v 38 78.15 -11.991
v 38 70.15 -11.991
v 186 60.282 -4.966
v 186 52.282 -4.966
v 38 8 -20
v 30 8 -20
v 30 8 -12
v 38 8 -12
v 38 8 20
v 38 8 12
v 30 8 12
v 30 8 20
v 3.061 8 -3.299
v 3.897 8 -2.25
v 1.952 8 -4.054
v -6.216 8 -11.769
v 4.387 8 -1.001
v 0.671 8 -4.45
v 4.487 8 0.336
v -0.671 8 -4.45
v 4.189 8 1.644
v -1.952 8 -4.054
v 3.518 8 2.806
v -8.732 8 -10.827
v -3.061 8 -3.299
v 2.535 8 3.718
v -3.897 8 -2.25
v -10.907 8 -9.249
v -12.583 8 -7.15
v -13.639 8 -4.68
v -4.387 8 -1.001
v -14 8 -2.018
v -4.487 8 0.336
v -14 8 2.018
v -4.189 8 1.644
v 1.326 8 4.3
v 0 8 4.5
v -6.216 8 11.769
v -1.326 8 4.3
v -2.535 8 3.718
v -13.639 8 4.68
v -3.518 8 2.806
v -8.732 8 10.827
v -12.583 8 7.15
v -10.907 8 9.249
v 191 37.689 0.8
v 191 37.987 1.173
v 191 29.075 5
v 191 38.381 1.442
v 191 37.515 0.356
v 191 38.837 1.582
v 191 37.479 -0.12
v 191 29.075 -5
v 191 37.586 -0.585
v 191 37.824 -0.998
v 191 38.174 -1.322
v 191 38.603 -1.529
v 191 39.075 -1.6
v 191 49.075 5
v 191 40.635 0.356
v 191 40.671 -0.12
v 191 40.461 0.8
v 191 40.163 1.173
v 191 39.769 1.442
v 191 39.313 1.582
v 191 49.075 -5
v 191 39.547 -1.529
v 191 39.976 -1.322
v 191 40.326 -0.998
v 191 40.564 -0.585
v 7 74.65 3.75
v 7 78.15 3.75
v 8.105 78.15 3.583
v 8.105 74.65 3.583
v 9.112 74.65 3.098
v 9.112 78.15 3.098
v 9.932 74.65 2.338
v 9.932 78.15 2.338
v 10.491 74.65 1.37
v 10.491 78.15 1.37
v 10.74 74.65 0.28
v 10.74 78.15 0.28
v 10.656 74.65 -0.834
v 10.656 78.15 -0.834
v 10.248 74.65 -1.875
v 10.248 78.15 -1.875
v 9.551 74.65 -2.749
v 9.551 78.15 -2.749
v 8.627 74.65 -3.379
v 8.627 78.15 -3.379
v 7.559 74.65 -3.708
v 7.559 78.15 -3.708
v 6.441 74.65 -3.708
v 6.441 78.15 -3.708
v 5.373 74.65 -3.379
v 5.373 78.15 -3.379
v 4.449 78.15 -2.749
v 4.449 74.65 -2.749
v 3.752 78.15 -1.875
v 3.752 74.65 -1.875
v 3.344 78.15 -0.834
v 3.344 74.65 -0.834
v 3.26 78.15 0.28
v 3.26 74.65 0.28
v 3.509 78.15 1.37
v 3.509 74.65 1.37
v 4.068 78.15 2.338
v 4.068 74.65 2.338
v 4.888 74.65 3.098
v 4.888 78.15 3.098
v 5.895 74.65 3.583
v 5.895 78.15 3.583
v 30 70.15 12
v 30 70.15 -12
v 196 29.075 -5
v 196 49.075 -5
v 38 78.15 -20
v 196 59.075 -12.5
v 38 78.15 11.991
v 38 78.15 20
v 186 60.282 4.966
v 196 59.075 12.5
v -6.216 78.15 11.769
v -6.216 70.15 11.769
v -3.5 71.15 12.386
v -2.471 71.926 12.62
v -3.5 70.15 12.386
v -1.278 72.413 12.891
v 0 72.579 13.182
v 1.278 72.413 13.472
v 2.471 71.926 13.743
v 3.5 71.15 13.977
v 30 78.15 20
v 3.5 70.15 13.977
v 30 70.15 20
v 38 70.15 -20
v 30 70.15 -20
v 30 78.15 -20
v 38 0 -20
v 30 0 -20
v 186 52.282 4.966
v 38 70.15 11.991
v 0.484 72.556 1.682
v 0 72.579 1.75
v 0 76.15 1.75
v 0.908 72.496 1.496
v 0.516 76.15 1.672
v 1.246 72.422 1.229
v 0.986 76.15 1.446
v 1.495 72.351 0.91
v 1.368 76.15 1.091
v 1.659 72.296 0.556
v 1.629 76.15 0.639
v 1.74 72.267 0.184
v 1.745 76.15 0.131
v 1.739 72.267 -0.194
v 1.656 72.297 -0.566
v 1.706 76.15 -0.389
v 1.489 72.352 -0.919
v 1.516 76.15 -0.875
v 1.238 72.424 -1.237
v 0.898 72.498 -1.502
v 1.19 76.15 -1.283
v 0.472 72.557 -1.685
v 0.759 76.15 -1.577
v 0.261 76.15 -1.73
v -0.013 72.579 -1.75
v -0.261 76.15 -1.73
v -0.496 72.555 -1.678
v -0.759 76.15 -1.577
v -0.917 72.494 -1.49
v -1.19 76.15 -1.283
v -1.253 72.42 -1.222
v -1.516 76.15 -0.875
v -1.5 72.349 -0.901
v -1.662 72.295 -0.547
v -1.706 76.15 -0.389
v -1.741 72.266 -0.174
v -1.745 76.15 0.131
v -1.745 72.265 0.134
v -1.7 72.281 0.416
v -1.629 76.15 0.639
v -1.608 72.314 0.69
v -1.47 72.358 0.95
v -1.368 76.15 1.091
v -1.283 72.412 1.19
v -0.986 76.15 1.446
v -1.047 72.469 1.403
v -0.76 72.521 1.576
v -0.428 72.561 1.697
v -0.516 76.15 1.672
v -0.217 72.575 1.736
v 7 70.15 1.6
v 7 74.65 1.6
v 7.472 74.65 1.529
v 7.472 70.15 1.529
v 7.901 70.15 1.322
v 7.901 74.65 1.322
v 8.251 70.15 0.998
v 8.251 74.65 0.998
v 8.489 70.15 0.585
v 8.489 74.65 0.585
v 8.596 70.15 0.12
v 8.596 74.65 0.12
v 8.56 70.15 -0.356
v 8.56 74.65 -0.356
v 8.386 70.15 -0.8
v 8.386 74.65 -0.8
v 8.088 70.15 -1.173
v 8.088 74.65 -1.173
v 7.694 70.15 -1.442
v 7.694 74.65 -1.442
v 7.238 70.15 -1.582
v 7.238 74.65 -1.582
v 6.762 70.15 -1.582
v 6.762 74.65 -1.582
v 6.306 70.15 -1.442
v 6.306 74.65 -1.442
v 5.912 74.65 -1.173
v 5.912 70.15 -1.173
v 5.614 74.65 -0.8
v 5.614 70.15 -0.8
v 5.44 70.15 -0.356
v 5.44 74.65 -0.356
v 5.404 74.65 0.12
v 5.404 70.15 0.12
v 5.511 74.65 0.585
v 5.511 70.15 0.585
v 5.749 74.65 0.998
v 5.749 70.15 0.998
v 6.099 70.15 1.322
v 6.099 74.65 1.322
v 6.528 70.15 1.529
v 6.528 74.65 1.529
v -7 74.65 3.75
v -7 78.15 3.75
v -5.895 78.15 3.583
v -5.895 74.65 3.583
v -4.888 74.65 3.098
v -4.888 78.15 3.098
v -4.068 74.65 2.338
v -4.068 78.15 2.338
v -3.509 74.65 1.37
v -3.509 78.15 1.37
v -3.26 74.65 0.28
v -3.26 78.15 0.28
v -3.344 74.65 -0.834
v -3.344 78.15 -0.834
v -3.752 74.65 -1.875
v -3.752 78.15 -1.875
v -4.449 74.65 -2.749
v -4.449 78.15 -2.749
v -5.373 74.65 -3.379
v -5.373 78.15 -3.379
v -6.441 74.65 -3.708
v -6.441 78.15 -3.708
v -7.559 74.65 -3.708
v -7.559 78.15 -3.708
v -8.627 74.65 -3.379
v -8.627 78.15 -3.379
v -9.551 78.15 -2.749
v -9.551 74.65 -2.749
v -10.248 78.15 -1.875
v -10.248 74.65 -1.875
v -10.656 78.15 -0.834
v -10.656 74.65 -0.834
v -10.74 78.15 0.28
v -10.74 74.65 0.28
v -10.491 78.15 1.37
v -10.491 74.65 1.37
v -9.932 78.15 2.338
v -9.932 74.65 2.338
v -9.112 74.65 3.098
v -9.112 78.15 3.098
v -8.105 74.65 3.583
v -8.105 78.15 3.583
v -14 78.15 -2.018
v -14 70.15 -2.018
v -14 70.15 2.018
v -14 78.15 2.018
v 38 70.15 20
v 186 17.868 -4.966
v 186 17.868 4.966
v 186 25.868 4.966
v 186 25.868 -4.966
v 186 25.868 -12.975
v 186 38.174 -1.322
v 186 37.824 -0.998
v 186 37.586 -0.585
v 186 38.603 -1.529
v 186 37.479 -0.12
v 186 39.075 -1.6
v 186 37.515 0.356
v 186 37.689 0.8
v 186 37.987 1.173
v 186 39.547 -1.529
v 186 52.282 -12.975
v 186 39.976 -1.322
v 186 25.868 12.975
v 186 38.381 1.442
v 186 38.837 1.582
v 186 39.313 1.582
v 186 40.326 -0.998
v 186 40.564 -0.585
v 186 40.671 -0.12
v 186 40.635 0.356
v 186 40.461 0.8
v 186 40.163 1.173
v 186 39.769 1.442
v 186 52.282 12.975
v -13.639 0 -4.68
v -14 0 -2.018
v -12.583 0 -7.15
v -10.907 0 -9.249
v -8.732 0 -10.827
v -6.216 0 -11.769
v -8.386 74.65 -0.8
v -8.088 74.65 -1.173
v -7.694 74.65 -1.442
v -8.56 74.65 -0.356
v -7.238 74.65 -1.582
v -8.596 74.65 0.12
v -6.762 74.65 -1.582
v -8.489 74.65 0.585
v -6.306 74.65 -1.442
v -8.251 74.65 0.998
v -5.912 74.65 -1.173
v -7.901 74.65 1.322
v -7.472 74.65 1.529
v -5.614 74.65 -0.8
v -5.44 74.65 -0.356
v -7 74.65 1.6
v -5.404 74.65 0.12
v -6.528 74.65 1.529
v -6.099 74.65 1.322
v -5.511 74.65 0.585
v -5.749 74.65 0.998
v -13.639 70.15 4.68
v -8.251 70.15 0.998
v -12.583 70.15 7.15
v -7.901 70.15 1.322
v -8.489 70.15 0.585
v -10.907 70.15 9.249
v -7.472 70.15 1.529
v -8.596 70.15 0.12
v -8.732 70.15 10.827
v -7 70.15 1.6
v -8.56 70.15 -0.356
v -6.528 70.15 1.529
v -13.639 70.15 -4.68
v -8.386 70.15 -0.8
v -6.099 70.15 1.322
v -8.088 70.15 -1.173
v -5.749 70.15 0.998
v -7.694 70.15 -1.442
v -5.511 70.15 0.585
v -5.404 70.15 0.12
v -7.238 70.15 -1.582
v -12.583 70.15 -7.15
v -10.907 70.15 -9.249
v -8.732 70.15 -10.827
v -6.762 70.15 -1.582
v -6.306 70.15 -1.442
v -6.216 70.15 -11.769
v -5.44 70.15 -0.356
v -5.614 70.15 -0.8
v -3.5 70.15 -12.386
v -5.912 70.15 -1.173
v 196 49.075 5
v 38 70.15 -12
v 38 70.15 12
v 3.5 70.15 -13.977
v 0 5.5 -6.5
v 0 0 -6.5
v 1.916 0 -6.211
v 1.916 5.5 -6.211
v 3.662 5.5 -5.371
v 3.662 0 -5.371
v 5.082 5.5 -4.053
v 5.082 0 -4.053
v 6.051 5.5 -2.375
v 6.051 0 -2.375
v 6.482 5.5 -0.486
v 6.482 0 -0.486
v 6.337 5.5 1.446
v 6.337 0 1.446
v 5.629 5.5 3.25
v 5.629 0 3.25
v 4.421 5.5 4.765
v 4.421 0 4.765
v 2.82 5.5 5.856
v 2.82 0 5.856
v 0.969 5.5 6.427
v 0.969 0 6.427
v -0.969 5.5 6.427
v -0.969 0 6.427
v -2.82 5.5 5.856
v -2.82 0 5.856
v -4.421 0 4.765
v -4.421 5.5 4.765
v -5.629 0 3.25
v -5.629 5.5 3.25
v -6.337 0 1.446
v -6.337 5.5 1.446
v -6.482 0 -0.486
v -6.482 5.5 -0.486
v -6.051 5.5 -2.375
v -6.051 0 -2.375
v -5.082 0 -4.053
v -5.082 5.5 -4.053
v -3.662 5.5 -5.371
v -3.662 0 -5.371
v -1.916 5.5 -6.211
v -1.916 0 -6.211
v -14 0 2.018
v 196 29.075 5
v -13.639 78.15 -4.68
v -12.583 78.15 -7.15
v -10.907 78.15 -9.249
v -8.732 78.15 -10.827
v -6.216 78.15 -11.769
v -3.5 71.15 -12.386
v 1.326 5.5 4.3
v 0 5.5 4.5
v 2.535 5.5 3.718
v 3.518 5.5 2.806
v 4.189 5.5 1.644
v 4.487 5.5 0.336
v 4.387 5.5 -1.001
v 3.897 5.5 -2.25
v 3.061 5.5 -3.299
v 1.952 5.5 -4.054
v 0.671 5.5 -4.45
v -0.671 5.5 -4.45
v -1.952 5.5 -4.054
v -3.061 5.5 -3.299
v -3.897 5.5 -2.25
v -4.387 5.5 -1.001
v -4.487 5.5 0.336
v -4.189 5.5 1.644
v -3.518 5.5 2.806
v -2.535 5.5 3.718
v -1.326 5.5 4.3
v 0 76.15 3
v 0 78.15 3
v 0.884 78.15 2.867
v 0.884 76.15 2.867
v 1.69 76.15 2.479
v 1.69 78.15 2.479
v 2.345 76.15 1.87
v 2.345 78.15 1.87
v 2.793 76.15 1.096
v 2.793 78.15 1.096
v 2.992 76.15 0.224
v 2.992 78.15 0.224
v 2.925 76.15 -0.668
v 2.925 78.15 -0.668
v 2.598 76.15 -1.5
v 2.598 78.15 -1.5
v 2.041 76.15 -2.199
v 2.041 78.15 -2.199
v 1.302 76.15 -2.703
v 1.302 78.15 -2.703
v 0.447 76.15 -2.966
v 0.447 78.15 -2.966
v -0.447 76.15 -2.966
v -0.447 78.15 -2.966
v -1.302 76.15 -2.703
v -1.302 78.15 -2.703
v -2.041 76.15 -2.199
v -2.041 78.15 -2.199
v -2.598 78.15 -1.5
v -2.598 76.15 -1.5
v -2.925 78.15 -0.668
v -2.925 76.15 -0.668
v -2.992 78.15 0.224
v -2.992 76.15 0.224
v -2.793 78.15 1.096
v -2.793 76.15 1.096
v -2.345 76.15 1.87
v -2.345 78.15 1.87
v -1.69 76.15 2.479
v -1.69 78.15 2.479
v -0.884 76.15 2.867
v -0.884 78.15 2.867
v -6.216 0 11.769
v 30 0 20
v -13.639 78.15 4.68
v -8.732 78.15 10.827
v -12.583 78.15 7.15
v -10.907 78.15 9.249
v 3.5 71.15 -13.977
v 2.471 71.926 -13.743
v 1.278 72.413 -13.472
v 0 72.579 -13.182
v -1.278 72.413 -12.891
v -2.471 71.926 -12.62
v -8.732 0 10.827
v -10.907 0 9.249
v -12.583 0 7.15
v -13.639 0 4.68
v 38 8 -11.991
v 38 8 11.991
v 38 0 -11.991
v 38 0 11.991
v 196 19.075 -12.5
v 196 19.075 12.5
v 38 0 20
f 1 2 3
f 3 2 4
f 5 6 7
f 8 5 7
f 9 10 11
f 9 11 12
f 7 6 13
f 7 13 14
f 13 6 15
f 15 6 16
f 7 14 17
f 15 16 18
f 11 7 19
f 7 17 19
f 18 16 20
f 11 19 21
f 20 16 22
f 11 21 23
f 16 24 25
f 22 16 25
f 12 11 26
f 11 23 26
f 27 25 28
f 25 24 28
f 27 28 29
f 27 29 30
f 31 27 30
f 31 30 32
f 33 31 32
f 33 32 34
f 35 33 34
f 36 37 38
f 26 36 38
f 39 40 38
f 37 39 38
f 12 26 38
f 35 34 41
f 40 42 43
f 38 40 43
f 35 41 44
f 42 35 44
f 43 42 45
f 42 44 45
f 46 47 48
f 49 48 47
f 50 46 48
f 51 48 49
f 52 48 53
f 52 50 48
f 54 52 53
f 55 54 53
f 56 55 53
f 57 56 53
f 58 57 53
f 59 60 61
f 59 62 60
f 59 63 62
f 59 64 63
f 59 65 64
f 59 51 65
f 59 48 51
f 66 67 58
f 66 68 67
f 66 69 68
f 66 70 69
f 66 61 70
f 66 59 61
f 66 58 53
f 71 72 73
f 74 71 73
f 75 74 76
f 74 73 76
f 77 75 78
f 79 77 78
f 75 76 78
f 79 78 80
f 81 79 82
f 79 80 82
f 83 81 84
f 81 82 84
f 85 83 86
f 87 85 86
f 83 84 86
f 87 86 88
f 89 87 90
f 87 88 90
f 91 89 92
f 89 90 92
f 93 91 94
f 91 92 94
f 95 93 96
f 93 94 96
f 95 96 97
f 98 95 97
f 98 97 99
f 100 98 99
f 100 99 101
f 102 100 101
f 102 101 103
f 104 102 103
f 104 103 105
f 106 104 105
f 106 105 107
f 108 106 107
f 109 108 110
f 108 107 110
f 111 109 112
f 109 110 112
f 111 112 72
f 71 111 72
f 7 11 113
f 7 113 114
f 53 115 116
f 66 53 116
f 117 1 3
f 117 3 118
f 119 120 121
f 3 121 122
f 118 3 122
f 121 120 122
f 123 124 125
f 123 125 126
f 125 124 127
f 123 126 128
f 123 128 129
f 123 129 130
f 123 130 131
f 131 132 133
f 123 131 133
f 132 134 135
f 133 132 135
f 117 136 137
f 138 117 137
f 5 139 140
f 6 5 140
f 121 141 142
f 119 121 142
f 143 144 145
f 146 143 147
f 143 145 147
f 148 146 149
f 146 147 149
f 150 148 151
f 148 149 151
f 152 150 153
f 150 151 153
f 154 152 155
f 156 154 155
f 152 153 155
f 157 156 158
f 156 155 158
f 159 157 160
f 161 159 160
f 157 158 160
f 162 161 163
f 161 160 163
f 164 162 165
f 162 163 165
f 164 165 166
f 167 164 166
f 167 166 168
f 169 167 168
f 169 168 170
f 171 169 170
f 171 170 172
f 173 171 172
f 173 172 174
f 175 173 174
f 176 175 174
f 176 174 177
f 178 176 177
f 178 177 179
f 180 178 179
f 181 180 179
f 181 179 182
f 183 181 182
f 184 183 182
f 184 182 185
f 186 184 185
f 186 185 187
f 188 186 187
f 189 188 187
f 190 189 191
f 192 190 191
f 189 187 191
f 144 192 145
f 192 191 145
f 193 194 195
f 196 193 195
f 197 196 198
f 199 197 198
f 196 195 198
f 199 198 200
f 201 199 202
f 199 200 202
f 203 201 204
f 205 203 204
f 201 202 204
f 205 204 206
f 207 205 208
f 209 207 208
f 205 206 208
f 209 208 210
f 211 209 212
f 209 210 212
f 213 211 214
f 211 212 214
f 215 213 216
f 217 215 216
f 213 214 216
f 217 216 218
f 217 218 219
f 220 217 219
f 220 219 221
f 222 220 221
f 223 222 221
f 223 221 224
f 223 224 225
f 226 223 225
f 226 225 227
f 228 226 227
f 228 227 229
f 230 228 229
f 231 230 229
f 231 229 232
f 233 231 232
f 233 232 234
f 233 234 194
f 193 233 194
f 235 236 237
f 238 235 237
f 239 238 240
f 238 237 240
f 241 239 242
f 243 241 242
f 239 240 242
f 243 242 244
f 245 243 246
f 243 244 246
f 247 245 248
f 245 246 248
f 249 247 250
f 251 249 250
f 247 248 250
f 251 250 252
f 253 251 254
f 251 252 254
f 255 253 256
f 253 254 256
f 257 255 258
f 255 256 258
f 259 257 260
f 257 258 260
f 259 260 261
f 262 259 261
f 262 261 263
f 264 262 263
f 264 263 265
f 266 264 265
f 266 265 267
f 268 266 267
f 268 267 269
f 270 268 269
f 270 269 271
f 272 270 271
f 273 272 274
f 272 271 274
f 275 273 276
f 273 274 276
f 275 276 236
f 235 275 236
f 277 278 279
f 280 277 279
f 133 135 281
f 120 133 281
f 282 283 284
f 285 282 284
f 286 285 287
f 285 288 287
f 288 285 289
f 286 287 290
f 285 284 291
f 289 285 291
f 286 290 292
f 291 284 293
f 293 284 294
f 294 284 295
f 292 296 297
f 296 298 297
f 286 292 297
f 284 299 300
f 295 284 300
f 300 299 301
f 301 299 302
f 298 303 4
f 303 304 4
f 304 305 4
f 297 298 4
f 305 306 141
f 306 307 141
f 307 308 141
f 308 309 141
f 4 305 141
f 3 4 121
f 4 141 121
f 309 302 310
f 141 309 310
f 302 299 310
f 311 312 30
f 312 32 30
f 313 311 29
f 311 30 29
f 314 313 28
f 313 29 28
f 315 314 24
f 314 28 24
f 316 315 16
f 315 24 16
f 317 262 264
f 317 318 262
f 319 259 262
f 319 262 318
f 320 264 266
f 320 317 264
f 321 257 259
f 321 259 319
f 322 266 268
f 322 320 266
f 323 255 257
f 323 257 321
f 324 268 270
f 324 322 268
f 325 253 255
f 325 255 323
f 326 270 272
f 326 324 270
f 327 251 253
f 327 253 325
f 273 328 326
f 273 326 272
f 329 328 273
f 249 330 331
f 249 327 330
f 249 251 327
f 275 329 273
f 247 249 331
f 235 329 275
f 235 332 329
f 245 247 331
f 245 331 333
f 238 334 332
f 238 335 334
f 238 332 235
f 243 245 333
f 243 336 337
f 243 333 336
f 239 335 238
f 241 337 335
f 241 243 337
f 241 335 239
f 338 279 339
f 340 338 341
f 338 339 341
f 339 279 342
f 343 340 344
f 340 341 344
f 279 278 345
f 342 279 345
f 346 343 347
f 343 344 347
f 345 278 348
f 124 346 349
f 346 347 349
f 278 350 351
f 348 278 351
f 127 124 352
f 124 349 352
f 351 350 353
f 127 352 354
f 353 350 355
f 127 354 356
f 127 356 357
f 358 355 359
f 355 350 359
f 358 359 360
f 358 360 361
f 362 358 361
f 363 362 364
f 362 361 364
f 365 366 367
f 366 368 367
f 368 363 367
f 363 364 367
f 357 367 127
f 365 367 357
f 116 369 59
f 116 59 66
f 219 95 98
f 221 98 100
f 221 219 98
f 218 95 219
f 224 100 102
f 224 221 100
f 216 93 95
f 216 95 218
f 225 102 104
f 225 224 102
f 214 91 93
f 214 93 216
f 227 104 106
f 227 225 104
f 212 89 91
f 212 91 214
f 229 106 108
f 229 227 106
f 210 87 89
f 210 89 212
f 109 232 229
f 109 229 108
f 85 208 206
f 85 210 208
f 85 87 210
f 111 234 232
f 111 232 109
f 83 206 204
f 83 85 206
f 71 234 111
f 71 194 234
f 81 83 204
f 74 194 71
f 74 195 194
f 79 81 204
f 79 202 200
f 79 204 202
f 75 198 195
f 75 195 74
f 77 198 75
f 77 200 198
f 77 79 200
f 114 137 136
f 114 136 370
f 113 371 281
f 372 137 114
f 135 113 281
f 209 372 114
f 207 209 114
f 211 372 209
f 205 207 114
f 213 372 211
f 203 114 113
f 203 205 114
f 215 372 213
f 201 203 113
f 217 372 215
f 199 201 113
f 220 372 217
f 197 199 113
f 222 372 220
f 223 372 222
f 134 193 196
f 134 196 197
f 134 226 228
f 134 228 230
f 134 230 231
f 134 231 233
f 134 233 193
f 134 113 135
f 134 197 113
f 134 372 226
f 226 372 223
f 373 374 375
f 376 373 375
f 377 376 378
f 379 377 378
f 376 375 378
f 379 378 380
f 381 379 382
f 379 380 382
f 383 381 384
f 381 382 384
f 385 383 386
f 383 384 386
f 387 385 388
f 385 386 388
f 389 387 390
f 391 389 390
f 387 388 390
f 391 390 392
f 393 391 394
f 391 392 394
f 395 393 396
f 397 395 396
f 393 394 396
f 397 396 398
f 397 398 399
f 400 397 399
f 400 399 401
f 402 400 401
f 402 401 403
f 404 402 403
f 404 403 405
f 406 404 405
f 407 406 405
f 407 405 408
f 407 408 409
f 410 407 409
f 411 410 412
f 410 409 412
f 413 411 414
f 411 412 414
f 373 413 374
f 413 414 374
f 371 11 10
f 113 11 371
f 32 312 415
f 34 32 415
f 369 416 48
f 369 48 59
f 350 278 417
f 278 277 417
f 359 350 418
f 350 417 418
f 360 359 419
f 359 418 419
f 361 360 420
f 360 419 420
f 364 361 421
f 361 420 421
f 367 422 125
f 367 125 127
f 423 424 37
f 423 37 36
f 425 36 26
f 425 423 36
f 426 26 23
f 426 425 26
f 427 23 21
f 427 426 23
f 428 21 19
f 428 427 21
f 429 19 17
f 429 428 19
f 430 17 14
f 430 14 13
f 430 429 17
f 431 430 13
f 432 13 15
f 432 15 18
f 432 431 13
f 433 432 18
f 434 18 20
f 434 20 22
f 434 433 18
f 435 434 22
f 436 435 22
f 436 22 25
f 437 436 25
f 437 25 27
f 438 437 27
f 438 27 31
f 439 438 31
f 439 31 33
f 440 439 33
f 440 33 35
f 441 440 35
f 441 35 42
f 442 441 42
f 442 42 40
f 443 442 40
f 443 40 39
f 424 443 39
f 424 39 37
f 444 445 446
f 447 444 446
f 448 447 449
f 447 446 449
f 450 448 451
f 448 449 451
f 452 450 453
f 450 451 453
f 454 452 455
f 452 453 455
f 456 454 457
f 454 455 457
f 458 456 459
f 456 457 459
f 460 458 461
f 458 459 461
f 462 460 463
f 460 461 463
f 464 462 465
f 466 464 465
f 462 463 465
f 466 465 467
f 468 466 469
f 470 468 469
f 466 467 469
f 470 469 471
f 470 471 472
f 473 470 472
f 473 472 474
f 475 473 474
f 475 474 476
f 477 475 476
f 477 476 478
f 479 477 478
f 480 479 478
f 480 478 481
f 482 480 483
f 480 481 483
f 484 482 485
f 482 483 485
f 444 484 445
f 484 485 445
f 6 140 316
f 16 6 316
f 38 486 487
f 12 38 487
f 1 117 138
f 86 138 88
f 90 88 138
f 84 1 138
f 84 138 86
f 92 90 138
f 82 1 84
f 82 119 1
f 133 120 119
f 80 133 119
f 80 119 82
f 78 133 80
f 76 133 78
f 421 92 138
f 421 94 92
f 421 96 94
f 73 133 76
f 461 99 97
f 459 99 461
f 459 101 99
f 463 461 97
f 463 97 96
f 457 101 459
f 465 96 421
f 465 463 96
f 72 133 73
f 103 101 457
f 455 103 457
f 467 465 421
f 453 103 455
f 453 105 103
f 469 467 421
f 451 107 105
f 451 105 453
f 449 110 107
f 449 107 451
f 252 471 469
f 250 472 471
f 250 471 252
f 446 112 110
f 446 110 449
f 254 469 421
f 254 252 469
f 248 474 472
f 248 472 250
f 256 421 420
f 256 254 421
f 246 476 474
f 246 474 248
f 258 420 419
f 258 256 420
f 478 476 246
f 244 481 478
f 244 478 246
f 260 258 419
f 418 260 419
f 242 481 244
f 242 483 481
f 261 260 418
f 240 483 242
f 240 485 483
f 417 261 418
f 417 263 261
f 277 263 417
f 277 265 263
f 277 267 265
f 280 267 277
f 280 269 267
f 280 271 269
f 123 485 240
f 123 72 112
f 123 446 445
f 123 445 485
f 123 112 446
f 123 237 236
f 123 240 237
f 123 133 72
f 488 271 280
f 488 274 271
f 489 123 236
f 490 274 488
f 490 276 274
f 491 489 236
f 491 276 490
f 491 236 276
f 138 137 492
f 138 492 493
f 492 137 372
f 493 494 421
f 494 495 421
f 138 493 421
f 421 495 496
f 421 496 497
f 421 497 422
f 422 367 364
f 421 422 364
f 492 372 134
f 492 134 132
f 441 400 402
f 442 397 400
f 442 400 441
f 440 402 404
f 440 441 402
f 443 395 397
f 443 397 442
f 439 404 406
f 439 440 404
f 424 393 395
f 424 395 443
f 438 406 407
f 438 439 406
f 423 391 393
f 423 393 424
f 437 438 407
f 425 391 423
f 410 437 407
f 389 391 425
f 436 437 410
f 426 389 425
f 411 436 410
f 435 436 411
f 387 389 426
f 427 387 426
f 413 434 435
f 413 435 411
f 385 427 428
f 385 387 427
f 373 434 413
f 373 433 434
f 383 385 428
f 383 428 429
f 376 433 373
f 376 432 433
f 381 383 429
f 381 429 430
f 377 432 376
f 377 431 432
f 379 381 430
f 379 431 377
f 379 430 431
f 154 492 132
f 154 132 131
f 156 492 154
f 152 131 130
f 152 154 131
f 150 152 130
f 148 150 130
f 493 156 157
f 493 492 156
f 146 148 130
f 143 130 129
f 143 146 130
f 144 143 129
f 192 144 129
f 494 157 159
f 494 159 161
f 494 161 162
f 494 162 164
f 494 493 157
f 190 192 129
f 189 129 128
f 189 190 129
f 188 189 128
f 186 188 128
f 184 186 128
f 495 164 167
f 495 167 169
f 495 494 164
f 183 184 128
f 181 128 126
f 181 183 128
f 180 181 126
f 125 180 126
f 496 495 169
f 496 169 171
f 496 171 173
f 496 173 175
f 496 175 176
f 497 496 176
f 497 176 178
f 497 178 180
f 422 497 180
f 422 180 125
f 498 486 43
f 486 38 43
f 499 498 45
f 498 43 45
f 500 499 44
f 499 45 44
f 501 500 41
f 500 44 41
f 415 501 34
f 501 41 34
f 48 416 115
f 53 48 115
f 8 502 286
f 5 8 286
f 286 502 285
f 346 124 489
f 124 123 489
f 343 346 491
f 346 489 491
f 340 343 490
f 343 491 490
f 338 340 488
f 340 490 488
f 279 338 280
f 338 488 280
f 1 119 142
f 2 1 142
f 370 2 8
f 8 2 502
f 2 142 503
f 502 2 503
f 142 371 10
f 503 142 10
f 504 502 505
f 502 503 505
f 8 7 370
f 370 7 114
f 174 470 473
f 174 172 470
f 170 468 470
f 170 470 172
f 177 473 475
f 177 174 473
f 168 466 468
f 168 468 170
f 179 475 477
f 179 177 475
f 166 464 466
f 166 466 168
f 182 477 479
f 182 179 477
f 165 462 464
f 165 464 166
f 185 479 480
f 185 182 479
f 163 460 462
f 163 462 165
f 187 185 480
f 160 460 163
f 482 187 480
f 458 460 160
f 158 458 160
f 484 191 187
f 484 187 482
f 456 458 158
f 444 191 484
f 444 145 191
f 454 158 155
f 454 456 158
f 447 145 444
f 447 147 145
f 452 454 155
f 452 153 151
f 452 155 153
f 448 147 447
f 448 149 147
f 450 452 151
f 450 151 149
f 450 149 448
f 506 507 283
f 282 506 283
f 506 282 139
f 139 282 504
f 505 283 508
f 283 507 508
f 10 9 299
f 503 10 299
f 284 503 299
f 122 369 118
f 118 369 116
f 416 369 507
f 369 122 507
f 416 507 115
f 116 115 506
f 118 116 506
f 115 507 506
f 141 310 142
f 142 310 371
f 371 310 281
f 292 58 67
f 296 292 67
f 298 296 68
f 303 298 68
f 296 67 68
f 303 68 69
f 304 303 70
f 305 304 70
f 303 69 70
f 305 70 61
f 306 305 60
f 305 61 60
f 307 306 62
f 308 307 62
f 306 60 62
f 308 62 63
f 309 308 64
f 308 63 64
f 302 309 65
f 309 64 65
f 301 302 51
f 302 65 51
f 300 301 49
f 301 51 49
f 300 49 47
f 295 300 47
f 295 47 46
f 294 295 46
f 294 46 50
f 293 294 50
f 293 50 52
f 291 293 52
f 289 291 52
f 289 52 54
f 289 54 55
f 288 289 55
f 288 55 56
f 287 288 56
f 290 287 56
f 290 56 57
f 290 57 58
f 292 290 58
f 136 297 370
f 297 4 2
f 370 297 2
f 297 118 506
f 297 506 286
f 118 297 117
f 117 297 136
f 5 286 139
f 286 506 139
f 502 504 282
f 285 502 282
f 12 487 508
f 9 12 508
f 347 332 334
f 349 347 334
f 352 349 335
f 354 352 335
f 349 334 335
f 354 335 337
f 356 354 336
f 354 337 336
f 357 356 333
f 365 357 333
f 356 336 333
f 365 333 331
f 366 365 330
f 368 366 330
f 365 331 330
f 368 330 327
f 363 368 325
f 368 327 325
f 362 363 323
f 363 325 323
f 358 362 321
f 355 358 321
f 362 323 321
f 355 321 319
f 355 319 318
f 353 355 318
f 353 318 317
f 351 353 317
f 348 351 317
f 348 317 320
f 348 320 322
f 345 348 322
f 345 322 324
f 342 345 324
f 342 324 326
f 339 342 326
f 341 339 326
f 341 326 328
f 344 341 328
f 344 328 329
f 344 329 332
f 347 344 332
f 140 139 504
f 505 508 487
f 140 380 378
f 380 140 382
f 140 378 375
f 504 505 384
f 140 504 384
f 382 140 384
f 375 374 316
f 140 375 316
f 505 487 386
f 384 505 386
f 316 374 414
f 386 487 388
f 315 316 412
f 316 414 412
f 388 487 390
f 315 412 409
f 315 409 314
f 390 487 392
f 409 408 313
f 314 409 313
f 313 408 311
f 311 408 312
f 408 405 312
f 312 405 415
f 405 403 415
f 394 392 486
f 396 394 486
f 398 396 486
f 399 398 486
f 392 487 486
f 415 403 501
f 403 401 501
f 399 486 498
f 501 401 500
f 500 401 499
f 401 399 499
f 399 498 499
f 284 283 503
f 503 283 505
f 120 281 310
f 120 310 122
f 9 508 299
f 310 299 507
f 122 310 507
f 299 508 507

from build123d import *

# Parameters (mm, degrees)
SZKIC1_R                               = 4.5
DODANIE_WYCI_GNI_CIE1_DEPTH            = 8
SZKIC23_R                              = 6.5
WYTNIJ_WYCI_GNI_CIE11_DEPTH            = 5.5
SZKIC4_W                               = 8
SZKIC4_H                               = 40
DODANIE_WYCI_GNI_CIE2_DEPTH            = 62.15
DODANIE_WYCI_GNI_CIE3_DEPTH            = 8
WYTNIJ_WYCI_GNI_CIE3_REACH             = 91.171
SZKIC6_R                               = 1.6
SZKIC7_R                               = 3.75
WYTNIJ_WYCI_GNI_CIE4_DEPTH             = 3.5
WYTNIJ_WYCI_GNI_CIE5_REACH             = 97.976
WYTNIJ_WYCI_GNI_CIE5_DIRECTION_2_REACH = 97.976
SZKIC10_R                              = 3
WYTNIJ_WYCI_GNI_CIE6_DEPTH             = 2
WYTNIJ_WYCI_GNI_CIE7_REACH             = 93.888
SZKIC14_W                              = 8
SZKIC14_H                              = 62.15
DODANIE_WYCI_GNI_CIE5_DEPTH            = 78.15
WYTNIJ_WYCI_GNI_CIE9_DEPTH             = 215.763643338
WYTNIJ_WYCI_GNI_CIE9_DEPTH_BACK        = 215.763643338
SZKIC20_W                              = 10
SZKIC20_H                              = 20
WYTNIJ_WYCI_GNI_CIE10_DEPTH            = 5
ZAOKR_GLENIE1_R                        = 10
WYTNIJ_WYCI_GNI_CIE12_REACH            = 213.222
WYTNIJ_WYCI_GNI_CIE12_END_RADIUS       = 5
SZKIC24_R                              = 1.75
WYTNIJ_WYCI_GNI_CIE13_REACH            = 222.301
SZKIC25_R                              = 1.6


with BuildPart() as part:
    # Szkic1 → Dodanie-wyciągnięcie1 (new body)
    with BuildSketch(Plane(origin=(0, 0, 0), x_dir=(1, 0, 0), z_dir=(0, 1, 0))):
        Polygon((-14, -10), (30, -20), (38, -20), (38, 20), (30, 20), (-14, 10), align=None)
        with Locations(Location((0, 0, 0), (0, 0, 270))):
            Circle(SZKIC1_R, mode=Mode.SUBTRACT)
    extrude(amount=DODANIE_WYCI_GNI_CIE1_DEPTH)

    # Szkic23 → Wytnij-wyciągnięcie11 (cut)
    with BuildSketch(Plane.XZ):
        with Locations(Location((0, 0, 0), (0, 0, 270))):
            Circle(SZKIC23_R)
    extrude(amount=-WYTNIJ_WYCI_GNI_CIE11_DEPTH, mode=Mode.SUBTRACT)

    # Szkic4 → Dodanie-wyciągnięcie2 (add)
    with BuildSketch(Plane(origin=(0, 8, 0), x_dir=(1, 0, 0), z_dir=(0, 1, 0))):
        with Locations((34, 0)):
            Rectangle(SZKIC4_W, SZKIC4_H)
    extrude(amount=DODANIE_WYCI_GNI_CIE2_DEPTH)

    # Szkic5 → Dodanie-wyciągnięcie3 (add)
    with BuildSketch(Plane(origin=(0, 70.15, 0), x_dir=(1, 0, 0), z_dir=(0, 1, 0))):
        Polygon((38, -20), (38, 20), (30, 20), (-14, 10), (-14, -10), (30, -20), align=None)
    extrude(amount=DODANIE_WYCI_GNI_CIE3_DEPTH)

    # Szkic6 → Wytnij-wyciągnięcie3 (cut, up to next)
    with BuildSketch(Plane(origin=(0, 78.15, 0), x_dir=(1, 0, 0), z_dir=(0, 1, 0)), mode=Mode.PRIVATE) as wytnij_wyci_gni_cie3_sk1:
        with Locations(Location((-7, 0, 0), (0, 0, 270))):
            Circle(SZKIC6_R)
    wytnij_wyci_gni_cie3_tool1 = extrude(wytnij_wyci_gni_cie3_sk1.sketch, amount=-WYTNIJ_WYCI_GNI_CIE3_REACH, mode=Mode.PRIVATE) & part.part
    # Szkic6 → Wytnij-wyciągnięcie3 (cut, up to next)
    with BuildSketch(Plane(origin=(0, 78.15, 0), x_dir=(1, 0, 0), z_dir=(0, 1, 0)), mode=Mode.PRIVATE) as wytnij_wyci_gni_cie3_sk2:
        with Locations(Location((7, 0, 0), (0, 0, 270))):
            Circle(SZKIC6_R)
    wytnij_wyci_gni_cie3_tool2 = extrude(wytnij_wyci_gni_cie3_sk2.sketch, amount=-WYTNIJ_WYCI_GNI_CIE3_REACH, mode=Mode.PRIVATE) & part.part
    add(wytnij_wyci_gni_cie3_tool1.solids().sort_by_distance((-7, 78.15, 0))[0], mode=Mode.SUBTRACT)
    add(wytnij_wyci_gni_cie3_tool2.solids().sort_by_distance((7, 78.15, 0))[0], mode=Mode.SUBTRACT)

    # Szkic7 → Wytnij-wyciągnięcie4 (cut)
    with BuildSketch(Plane(origin=(0, 78.15, 0), x_dir=(1, 0, 0), z_dir=(0, 1, 0))):
        with Locations(Location((7, 0, 0), (0, 0, 270))):
            Circle(SZKIC7_R)
        with Locations(Location((-7, 0, 0), (0, 0, 270))):
            Circle(SZKIC7_R)
    extrude(amount=-WYTNIJ_WYCI_GNI_CIE4_DEPTH, mode=Mode.SUBTRACT)

    # Wytnij-wyciągnięcie5: up to this plane
    wytnij_wyci_gni_cie5_end = Plane(origin=(30, 78.15, -20), z_dir=(0.22162110358896817, 0, 0.9751328557914598))
    # Szkic9 → Wytnij-wyciągnięcie5 (cut, up to the surface)
    with BuildSketch(Plane(origin=(-14, 0, 0), x_dir=(1, 0, 0), z_dir=(0, 0, 1)), mode=Mode.PRIVATE) as wytnij_wyci_gni_cie5_sk1:
        with BuildLine():
            Line((10.5, 70.15), (17.5, 70.15))
            Line((17.5, 70.15), (17.5, 71.15))
            ThreePointArc((17.5, 71.15), (14, 72.579285786), (10.5, 71.15))
            Line((10.5, 71.15), (10.5, 70.15))
        make_face()
    wytnij_wyci_gni_cie5_tool1 = split(extrude(wytnij_wyci_gni_cie5_sk1.sketch, amount=-WYTNIJ_WYCI_GNI_CIE5_REACH, mode=Mode.PRIVATE), bisect_by=wytnij_wyci_gni_cie5_end, keep=Keep.BOTH, mode=Mode.PRIVATE)
    add(wytnij_wyci_gni_cie5_tool1.solids().sort_by_distance((0, 71.185303, 0))[0], mode=Mode.SUBTRACT)

    # Wytnij-wyciągnięcie5 direction 2: up to this plane
    wytnij_wyci_gni_cie5_direction_2_end = Plane(origin=(-14, 78.15, 10), z_dir=(0.22162110358896792, 0, -0.9751328557914598))
    # Szkic9 → Wytnij-wyciągnięcie5 direction 2 (cut, up to the surface)
    with BuildSketch(Plane(origin=(-14, 0, 0), x_dir=(1, 0, 0), z_dir=(0, 0, 1)), mode=Mode.PRIVATE) as wytnij_wyci_gni_cie5_direction_2_sk1:
        with BuildLine():
            Line((10.5, 70.15), (17.5, 70.15))
            Line((17.5, 70.15), (17.5, 71.15))
            ThreePointArc((17.5, 71.15), (14, 72.579285786), (10.5, 71.15))
            Line((10.5, 71.15), (10.5, 70.15))
        make_face()
    wytnij_wyci_gni_cie5_direction_2_tool1 = split(extrude(wytnij_wyci_gni_cie5_direction_2_sk1.sketch, amount=WYTNIJ_WYCI_GNI_CIE5_DIRECTION_2_REACH, mode=Mode.PRIVATE), bisect_by=wytnij_wyci_gni_cie5_direction_2_end, keep=Keep.BOTH, mode=Mode.PRIVATE)
    add(wytnij_wyci_gni_cie5_direction_2_tool1.solids().sort_by_distance((0, 71.185303, 0))[0], mode=Mode.SUBTRACT)

    # Szkic10 → Wytnij-wyciągnięcie6 (cut)
    with BuildSketch(Plane(origin=(0, 78.15, 0), x_dir=(1, 0, 0), z_dir=(0, 1, 0))):
        with Locations(Location((0, 0, 0), (0, 0, 270))):
            Circle(SZKIC10_R)
    extrude(amount=-WYTNIJ_WYCI_GNI_CIE6_DEPTH, mode=Mode.SUBTRACT)

    # Szkic14 → Wytnij-wyciągnięcie7 (cut, up to next)
    with BuildSketch(Plane.ZY.offset(-30), mode=Mode.PRIVATE) as wytnij_wyci_gni_cie7_sk1:
        with Locations((-16, 39.075)):
            Rectangle(SZKIC14_W, SZKIC14_H)
    wytnij_wyci_gni_cie7_tool1 = extrude(wytnij_wyci_gni_cie7_sk1.sketch, amount=-WYTNIJ_WYCI_GNI_CIE7_REACH, mode=Mode.PRIVATE) & part.part
    # Szkic14 → Wytnij-wyciągnięcie7 (cut, up to next)
    with BuildSketch(Plane.ZY.offset(-30), mode=Mode.PRIVATE) as wytnij_wyci_gni_cie7_sk2:
        with Locations((16, 39.075)):
            Rectangle(SZKIC14_W, SZKIC14_H)
    wytnij_wyci_gni_cie7_tool2 = extrude(wytnij_wyci_gni_cie7_sk2.sketch, amount=-WYTNIJ_WYCI_GNI_CIE7_REACH, mode=Mode.PRIVATE) & part.part
    add(wytnij_wyci_gni_cie7_tool1.solids().sort_by_distance((30, 39.075, -16))[0], mode=Mode.SUBTRACT)
    add(wytnij_wyci_gni_cie7_tool2.solids().sort_by_distance((30, 39.075, 16))[0], mode=Mode.SUBTRACT)

    # Szkic17 → Dodanie-wyciągnięcie5 (add, through all)
    with BuildSketch(Plane.XZ):
        Polygon((38, 20), (196, 12.5), (196, -12.5), (38, -20), (38, -11.990992093), (186, -4.965675637), (186, 4.965675637), (38, 11.990992093), align=None)
    extrude(amount=-DODANIE_WYCI_GNI_CIE5_DEPTH)

    # Szkic18 → Wytnij-wyciągnięcie9 (cut, two sides: drawn at the far end of the back side and taken through both)
    with BuildSketch(Plane(origin=(0, 0, -20), x_dir=(-1, 0, 0), z_dir=(0, 0, -1)).offset(-WYTNIJ_WYCI_GNI_CIE9_DEPTH_BACK)):
        Polygon((-196, 0), (-196, 19.075), (-38, 0), align=None)
        Polygon((-196, 59.075), (-196, 78.15), (-38, 78.15), align=None)
        Polygon((-38, 8), (-186, 25.867721519), (-186, 52.282278481), (-38, 70.15), align=None)
    extrude(amount=WYTNIJ_WYCI_GNI_CIE9_DEPTH + WYTNIJ_WYCI_GNI_CIE9_DEPTH_BACK, mode=Mode.SUBTRACT)

    # Szkic20 → Wytnij-wyciągnięcie10 (cut)
    with BuildSketch(Plane(origin=(196, 0, 0), x_dir=(0, 0, -1), z_dir=(1, 0, 0))):
        with Locations((0, 39.075)):
            Rectangle(SZKIC20_W, SZKIC20_H)
    extrude(amount=-WYTNIJ_WYCI_GNI_CIE10_DEPTH, mode=Mode.SUBTRACT)

    # Zaokrąglenie1
    zaokr_glenie1_edges = [part.edges().sort_by_distance(p)[0] for p in [
        (-14, 4, 10),
        (-14, 4, -10),
        (-14, 74.15, -10),
        (-14, 74.15, 10),
    ]]
    fillet(zaokr_glenie1_edges, radius=ZAOKR_GLENIE1_R)

    # Wytnij-wyciągnięcie12: up to this cylinder (the profile starts outside it)
    wytnij_wyci_gni_cie12_end = Plane(origin=(0, 67.579285786, 0), z_dir=(0, 0, -1)) * Cylinder(WYTNIJ_WYCI_GNI_CIE12_END_RADIUS, 437.444, mode=Mode.PRIVATE)
    # Szkic24 → Wytnij-wyciągnięcie12 (cut, up to the surface)
    with BuildSketch(Plane(origin=(0, 76.15, 0), x_dir=(1, 0, 0), z_dir=(0, 1, 0)), mode=Mode.PRIVATE) as wytnij_wyci_gni_cie12_sk1:
        with Locations(Location((0, 0, 0), (0, 0, 270))):
            Circle(SZKIC24_R)
    wytnij_wyci_gni_cie12_tool1 = extrude(wytnij_wyci_gni_cie12_sk1.sketch, amount=-WYTNIJ_WYCI_GNI_CIE12_REACH, mode=Mode.PRIVATE) - wytnij_wyci_gni_cie12_end
    add(wytnij_wyci_gni_cie12_tool1.solids().sort_by_distance((0, 76.15, 0))[0], mode=Mode.SUBTRACT)

    # Szkic25 → Wytnij-wyciągnięcie13 (cut, up to next)
    with BuildSketch(Plane(origin=(191, 0, 0), x_dir=(0, 0, -1), z_dir=(1, 0, 0)), mode=Mode.PRIVATE) as wytnij_wyci_gni_cie13_sk1:
        with Locations((0, 39.075)):
            Circle(SZKIC25_R)
    wytnij_wyci_gni_cie13_tool1 = extrude(wytnij_wyci_gni_cie13_sk1.sketch, amount=-WYTNIJ_WYCI_GNI_CIE13_REACH, mode=Mode.PRIVATE) & part.part
    add(wytnij_wyci_gni_cie13_tool1.solids().sort_by_distance((191, 39.075, 0))[0], mode=Mode.SUBTRACT)


solid = part.part
